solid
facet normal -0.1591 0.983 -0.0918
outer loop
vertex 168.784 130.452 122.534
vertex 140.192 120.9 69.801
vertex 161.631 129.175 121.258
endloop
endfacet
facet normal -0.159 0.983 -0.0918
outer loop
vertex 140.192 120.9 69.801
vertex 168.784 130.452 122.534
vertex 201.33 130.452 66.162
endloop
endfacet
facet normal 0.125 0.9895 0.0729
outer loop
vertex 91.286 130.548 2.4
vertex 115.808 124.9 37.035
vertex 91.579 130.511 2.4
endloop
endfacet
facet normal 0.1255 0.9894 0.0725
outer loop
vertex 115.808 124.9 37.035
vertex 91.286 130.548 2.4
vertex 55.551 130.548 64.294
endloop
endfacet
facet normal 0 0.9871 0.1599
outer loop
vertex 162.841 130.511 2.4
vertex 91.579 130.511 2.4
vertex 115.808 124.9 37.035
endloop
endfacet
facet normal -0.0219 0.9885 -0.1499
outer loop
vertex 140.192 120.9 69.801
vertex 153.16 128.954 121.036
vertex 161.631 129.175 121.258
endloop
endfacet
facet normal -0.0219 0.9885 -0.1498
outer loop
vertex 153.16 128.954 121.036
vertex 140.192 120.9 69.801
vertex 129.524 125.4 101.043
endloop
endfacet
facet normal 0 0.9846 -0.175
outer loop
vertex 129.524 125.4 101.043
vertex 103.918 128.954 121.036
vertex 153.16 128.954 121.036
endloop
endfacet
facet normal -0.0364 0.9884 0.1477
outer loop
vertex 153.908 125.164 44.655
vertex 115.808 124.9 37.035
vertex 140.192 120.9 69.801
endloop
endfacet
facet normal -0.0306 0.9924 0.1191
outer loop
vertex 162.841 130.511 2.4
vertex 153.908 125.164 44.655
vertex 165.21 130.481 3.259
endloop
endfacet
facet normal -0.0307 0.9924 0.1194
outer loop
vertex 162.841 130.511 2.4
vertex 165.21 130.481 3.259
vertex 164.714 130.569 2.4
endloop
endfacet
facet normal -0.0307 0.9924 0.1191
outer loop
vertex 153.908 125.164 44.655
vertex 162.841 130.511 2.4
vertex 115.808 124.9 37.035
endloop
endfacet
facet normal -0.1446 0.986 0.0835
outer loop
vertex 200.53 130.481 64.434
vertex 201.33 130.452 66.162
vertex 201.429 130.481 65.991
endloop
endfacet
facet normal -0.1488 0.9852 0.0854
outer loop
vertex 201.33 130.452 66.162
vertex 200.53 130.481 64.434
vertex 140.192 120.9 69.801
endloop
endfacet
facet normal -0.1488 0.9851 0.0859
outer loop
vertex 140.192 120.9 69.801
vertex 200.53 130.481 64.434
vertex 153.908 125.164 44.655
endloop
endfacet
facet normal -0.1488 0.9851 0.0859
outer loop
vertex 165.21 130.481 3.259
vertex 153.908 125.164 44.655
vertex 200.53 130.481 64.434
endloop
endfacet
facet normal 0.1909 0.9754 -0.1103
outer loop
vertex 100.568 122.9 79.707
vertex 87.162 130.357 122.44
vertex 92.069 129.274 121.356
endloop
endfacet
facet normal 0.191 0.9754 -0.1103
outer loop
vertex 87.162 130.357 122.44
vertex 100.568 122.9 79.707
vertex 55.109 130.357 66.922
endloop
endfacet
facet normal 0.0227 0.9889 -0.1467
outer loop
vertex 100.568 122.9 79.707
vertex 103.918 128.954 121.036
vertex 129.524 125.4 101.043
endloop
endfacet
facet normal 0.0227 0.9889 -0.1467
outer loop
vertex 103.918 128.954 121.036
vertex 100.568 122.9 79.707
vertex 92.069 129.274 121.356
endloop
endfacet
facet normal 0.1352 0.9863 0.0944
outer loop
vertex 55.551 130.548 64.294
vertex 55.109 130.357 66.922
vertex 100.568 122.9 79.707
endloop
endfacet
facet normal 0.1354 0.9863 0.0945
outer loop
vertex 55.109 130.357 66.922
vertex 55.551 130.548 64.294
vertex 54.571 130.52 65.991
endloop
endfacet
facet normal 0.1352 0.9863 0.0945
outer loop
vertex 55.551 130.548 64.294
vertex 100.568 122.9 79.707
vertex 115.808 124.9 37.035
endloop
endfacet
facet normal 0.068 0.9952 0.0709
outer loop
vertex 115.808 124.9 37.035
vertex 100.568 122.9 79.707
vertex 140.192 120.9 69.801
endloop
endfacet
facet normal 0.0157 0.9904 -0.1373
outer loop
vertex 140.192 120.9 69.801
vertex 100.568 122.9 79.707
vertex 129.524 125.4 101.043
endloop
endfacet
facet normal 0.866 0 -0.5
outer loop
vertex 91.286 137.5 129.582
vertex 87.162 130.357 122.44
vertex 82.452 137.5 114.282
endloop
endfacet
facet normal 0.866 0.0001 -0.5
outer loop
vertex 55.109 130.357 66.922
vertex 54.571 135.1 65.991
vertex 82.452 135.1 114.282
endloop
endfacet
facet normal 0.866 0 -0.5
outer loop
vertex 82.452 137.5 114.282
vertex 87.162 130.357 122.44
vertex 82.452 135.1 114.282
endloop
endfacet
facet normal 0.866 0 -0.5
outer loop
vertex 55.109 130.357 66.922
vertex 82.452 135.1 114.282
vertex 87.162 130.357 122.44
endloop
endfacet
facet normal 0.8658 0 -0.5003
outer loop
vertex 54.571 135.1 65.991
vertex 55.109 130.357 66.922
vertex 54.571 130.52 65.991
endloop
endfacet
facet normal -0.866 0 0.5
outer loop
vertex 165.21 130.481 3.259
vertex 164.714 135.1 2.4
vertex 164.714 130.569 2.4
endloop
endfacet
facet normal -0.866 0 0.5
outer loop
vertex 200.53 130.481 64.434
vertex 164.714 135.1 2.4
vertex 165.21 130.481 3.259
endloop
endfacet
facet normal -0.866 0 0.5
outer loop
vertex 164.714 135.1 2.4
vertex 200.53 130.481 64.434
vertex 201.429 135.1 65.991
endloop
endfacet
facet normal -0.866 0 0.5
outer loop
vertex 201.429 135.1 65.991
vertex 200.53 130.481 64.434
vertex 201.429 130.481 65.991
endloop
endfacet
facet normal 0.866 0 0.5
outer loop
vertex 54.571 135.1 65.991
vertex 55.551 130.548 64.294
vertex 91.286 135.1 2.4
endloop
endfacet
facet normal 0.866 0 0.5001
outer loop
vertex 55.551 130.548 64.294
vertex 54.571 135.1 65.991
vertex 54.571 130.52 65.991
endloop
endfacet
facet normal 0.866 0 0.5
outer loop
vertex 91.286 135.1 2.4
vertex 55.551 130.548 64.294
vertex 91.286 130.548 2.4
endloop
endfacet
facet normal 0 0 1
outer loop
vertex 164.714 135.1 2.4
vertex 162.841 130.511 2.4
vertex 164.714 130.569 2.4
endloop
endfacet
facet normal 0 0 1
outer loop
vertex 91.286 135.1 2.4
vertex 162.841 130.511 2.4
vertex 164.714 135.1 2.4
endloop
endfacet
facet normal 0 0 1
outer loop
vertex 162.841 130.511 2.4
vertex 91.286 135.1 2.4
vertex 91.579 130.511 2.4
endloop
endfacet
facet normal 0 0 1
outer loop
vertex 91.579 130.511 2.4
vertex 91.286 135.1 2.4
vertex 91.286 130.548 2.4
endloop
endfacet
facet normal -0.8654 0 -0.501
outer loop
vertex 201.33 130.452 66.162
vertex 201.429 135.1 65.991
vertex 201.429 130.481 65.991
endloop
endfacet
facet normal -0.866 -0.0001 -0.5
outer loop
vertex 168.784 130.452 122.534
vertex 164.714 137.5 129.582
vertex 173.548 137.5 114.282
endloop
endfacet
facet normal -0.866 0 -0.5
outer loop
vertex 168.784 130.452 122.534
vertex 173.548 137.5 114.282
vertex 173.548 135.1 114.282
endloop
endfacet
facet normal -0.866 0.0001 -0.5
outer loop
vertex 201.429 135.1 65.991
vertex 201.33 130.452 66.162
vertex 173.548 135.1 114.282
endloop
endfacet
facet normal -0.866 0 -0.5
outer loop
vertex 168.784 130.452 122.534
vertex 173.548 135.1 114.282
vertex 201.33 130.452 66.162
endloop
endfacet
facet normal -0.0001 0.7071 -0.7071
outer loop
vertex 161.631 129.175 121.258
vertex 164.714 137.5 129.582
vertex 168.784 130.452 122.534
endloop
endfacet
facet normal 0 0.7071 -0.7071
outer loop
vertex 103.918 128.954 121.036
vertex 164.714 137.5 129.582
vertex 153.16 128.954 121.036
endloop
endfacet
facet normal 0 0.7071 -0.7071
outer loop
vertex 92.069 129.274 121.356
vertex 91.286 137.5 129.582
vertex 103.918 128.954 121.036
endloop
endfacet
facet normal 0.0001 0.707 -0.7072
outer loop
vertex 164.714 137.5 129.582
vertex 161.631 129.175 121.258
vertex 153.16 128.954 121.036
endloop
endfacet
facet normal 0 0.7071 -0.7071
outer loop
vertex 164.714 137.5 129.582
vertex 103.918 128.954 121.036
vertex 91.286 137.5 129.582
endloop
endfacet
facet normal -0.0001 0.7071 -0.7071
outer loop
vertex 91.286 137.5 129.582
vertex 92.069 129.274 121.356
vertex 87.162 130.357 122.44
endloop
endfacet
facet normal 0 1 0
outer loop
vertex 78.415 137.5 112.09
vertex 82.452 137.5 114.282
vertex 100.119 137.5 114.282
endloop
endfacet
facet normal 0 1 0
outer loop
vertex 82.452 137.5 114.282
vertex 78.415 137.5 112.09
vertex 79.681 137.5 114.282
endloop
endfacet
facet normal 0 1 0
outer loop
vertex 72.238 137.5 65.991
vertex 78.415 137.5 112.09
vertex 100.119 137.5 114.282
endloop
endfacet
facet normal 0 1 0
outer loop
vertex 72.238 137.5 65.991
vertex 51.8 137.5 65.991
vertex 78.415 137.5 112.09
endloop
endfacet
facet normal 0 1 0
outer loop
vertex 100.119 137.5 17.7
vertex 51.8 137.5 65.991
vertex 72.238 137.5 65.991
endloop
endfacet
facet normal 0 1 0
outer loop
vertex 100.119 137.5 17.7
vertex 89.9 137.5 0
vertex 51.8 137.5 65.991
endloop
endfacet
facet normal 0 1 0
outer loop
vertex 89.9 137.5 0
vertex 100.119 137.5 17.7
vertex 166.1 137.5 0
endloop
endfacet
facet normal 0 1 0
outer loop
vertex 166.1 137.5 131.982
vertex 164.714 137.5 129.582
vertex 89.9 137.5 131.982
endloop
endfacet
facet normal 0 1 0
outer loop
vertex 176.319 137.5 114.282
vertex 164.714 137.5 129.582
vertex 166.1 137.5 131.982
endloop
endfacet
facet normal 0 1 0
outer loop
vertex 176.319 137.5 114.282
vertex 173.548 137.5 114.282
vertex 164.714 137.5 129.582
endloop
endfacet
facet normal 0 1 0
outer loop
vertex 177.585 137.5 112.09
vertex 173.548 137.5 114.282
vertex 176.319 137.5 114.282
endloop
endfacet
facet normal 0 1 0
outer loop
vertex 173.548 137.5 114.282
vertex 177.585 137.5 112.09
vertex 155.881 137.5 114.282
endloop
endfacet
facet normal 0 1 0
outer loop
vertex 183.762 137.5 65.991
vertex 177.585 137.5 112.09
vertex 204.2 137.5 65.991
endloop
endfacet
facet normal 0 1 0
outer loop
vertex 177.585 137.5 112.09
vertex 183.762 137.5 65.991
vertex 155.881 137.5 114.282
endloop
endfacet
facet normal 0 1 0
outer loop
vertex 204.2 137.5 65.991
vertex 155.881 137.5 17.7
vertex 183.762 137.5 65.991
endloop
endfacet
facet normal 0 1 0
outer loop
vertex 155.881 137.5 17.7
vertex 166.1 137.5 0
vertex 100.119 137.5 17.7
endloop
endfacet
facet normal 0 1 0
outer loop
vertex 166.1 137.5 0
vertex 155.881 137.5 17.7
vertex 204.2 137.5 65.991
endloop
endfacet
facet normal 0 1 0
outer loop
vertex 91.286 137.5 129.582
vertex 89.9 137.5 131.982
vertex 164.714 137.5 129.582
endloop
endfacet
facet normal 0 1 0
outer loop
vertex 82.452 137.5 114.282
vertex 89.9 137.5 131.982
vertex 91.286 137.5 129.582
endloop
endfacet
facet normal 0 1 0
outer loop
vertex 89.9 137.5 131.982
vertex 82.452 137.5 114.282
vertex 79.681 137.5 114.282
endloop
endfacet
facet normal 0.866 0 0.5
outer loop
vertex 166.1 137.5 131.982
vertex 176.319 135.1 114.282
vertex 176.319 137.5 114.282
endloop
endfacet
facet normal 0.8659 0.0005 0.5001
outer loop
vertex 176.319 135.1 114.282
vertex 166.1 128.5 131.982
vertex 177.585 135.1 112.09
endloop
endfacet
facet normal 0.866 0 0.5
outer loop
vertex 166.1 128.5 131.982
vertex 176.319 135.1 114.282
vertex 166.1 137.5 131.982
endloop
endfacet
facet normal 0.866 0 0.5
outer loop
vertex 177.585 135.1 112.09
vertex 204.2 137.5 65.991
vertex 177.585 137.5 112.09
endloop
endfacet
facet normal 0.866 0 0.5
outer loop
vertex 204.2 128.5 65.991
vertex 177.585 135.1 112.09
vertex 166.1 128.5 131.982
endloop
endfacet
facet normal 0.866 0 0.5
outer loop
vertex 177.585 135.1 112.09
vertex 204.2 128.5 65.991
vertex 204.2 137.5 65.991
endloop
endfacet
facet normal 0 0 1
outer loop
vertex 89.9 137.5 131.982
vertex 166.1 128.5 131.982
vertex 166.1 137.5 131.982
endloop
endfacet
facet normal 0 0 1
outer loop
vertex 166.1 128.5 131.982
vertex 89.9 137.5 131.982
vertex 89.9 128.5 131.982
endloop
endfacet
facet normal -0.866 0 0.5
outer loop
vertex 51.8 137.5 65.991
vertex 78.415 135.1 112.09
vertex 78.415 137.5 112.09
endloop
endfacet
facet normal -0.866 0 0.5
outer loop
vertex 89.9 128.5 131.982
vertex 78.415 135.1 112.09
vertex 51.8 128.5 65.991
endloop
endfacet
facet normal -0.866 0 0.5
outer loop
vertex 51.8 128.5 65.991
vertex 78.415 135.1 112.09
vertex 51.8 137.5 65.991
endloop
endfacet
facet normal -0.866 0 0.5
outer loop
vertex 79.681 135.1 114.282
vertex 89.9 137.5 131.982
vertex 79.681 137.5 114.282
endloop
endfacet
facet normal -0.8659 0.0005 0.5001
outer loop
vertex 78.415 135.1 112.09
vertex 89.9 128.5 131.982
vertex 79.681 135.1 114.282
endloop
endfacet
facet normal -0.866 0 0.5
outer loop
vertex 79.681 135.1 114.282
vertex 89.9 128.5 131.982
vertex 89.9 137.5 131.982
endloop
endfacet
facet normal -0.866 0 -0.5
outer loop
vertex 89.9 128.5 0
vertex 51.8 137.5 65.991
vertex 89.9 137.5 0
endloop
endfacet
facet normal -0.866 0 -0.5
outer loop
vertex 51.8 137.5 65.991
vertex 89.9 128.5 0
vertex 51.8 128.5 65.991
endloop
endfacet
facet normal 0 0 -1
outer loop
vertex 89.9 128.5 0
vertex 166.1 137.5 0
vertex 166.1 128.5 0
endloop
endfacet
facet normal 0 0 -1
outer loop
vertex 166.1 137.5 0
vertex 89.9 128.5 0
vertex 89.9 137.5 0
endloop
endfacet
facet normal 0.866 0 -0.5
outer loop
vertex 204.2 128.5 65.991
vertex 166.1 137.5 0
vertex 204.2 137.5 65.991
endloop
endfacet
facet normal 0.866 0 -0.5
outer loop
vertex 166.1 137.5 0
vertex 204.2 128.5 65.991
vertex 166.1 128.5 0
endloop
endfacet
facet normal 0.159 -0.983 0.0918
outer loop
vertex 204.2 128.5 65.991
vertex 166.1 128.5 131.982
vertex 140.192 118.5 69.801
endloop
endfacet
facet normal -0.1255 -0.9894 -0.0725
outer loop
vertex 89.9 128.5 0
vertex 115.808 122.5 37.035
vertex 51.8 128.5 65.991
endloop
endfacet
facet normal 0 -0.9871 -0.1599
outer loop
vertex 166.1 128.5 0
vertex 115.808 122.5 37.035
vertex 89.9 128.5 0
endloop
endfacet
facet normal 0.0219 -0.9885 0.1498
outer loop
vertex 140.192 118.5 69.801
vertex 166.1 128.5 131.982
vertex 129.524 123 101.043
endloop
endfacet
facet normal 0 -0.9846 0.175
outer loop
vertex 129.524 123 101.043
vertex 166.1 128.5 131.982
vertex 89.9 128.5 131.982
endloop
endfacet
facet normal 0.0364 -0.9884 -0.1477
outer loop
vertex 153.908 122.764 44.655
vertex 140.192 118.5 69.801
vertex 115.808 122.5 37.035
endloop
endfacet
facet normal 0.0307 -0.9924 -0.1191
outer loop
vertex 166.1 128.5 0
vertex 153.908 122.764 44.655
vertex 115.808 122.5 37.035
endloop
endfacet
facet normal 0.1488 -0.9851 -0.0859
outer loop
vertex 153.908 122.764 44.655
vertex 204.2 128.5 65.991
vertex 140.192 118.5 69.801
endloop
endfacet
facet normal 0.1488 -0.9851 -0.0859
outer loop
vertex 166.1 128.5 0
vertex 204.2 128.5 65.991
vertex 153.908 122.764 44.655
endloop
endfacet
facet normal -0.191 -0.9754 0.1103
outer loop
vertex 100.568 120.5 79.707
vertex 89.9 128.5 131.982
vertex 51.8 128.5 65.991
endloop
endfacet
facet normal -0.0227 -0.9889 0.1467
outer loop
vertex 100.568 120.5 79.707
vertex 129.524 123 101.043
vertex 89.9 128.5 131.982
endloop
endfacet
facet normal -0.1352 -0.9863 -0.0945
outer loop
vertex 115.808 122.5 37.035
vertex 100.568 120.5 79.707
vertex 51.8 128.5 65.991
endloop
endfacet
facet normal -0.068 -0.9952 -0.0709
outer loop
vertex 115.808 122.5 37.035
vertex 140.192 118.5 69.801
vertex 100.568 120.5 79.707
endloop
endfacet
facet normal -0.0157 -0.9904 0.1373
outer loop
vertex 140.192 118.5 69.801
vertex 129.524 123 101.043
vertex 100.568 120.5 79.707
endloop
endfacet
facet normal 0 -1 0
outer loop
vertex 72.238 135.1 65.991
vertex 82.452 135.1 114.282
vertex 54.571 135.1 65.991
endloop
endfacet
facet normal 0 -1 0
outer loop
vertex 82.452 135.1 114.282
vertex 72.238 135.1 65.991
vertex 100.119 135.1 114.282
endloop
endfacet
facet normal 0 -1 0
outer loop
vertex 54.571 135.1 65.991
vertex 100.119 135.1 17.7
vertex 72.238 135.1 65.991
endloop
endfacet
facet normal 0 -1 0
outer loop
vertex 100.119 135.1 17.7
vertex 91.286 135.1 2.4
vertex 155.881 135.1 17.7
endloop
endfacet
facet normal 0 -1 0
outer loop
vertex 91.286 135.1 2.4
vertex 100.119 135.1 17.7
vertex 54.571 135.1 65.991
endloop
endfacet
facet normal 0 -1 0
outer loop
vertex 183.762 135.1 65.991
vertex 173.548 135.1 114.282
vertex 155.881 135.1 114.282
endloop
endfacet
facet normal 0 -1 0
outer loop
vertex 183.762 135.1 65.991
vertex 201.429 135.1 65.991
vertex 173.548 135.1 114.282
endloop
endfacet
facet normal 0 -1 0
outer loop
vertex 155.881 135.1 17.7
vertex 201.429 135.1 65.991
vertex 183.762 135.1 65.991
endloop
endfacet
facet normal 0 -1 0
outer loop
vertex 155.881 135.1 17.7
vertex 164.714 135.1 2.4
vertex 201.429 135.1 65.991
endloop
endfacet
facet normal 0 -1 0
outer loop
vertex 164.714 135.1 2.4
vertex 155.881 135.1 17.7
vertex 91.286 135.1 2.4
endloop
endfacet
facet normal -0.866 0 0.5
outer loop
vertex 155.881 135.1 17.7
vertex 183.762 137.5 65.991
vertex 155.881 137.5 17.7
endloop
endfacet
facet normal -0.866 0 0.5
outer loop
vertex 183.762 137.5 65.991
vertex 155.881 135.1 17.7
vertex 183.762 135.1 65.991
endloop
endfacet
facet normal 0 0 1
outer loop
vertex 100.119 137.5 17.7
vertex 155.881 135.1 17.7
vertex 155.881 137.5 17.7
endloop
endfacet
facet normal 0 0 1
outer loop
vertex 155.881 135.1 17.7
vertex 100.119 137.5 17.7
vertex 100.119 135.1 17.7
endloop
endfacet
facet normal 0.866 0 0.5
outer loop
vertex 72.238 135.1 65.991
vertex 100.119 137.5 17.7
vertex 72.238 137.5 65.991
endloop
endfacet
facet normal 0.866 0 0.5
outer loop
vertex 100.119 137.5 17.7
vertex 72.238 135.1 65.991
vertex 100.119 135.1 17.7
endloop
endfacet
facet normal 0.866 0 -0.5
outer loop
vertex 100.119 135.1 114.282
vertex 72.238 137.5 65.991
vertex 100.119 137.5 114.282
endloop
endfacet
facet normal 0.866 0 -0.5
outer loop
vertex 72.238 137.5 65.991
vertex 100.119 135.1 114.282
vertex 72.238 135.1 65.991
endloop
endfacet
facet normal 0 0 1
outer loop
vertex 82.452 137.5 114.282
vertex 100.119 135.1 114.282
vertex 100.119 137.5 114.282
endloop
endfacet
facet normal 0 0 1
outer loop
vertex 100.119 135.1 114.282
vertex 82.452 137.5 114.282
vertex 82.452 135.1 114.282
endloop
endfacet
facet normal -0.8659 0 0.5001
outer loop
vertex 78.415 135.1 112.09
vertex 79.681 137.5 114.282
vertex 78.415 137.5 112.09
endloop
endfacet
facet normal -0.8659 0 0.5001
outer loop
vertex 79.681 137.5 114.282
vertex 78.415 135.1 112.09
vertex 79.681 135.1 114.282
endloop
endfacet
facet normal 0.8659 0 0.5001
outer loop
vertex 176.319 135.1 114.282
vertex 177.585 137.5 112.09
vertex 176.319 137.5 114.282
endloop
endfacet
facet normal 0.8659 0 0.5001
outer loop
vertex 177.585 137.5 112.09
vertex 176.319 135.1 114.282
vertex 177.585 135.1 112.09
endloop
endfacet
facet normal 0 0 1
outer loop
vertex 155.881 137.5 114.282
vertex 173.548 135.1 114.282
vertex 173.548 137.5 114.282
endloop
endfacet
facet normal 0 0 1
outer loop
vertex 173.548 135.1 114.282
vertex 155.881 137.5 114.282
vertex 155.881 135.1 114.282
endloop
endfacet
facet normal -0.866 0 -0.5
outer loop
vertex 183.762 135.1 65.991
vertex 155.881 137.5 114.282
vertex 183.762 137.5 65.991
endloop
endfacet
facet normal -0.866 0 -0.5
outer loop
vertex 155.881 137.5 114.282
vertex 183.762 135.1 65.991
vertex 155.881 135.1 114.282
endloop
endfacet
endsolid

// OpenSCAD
/* Faceted architectural hex tile — candidate C02, NOT production released.
 * Standalone; OpenSCAD >= 2021.01. Units: mm.
 * Read ENGINEERING.md before printing or installing.
 * Local coordinates: XY = wall plane; rear tape plane Z=0; display +Z.
 * Upright output: local +Y becomes printer +Z; display faces printer -Y.
 * No temporary connections, supports, or adhesion geometry are in this CAD.
 */

/* [Output] */
mode = "trial_single"; // [trial_single,trial_pair,inspect,section]

/* [Product] */
corner_diameter = 152.4;
edge_depth = 9;
facet_rise = 10;

/* [Face pattern] */
// Relative rises of junctions A, B, C, D. Pattern XY is fixed and reproducible.
// A=upper-left interior, B=upper-center, C=right-center, D=lower-left interior.
// E=lower-right interior is derived to keep the broad right-hand face planar.
facet_profile = [0.80, 0.55, 1.00, 0.60];

/* [Shell] */
skin_axial = 2.4;       // Offset along local Z, NOT the facet-normal thickness.
perimeter_wall = 2.4;   // In-plane normal offset of the cavity hexagon.
roof_slope = 1;         // Local Z advance per local Y rise: 1 = 45 degrees.

/* [Mounting] */
land_width = 17.7;      // In-plane normal width; U-shaped, open at the top.
land_thickness = 2.4;
tape_width = 12.7;
tape_edge_allowance = 2.5; // Per side, for width placement tolerance.

/* [Manufacturing] */
pair_gap = 20;          // Minimum raw-model gap, along printer Y.
planned_brim = 8;       // Slicer allowance only; actual brim must be added there.
machine_margin = 5;    // In addition to brim, each XY side.
build_x = 256;         // Assumed machine envelope; replace with actual usable size.
build_y = 256;
build_z = 256;
z_clearance = 5;
nominal_line_width = 0.45;

/* [Validation limits] */
minimum_face_isolation = 1.6; // Conservative CLEAR AIR to underside of face skin.
minimum_skin_normal = 2;
minimum_cavity_radius = 20;
maximum_overhang_step_ratio = 1; // Horizontal layer advance / vertical layer rise.
nominal_size_tolerance = 1.524; // +/-1% of 152.4; resizing needs a new product review.

/* [Hidden] */
eps = 0.02;
r = corner_diameter/2;
a = r*cos(30);
depth = edge_depth + facet_rise;
// Six boundary corners followed by five image-inspired interior junctions.
// All XY coordinates below are normalized to corner radius, not apothem.
pattern_xy = concat([for (i=[0:5]) [cos(60*i),sin(60*i)]],
                    [[-0.36,0.18],[0.02,0.46],[0.16,0.05],
                     [-0.16,-0.38],[0.34,-0.28]]);
right_normal = [cos(30),-sin(30)];
function dot2(u,v) = u[0]*v[0]+u[1]*v[1];
valid_profile = assert(len(facet_profile) == 4 && min(facet_profile) > 0 &&
                       max(facet_profile) == 1,
                       "Face profile needs four positive fractions, max exactly 1.")
                facet_profile;
e_fraction = valid_profile[2]*(cos(30)-dot2(right_normal,pattern_xy[10]))/
                             (cos(30)-dot2(right_normal,pattern_xy[8]));
pattern_heights = concat([0,0,0,0,0,0],valid_profile,[e_fraction]);
// Explicit CCW triangles in XY; two adjacent triangles intentionally form
// one coplanar broad right-hand facet. No runtime/random triangulation.
pattern_triangles = [[1,8,0],[4,9,3],[5,9,4],[1,7,8],[2,7,1],
                     [9,10,8],[5,10,9],[8,10,0],[10,5,0],
                     [6,2,3],[6,7,2],[9,6,3],[6,9,8],[7,6,8]];
function cross2(u,v) = u[0]*v[1]-u[1]*v[0];
function triangle_gradient(t) =
    let(u=(pattern_xy[t[1]]-pattern_xy[t[0]])*r,
        v=(pattern_xy[t[2]]-pattern_xy[t[0]])*r,
        du=(pattern_heights[t[1]]-pattern_heights[t[0]])*facet_rise,
        dv=(pattern_heights[t[2]]-pattern_heights[t[0]])*facet_rise,
        det=cross2(u,v))
    [(du*v[1]-dv*u[1])/det,(u[0]*dv-v[0]*du)/det];
facet_gradient = max([for (t=pattern_triangles) norm(triangle_gradient(t))]);
normal_factor = sqrt(1 + facet_gradient*facet_gradient);
skin_normal = skin_axial/normal_factor;
air_gap_bound = (edge_depth-skin_axial-land_thickness)/normal_factor;
cavity_r = (a-perimeter_wall)/cos(30);
open_r = (a-land_width)/cos(30);
count = mode == "trial_pair" ? 2 : 1;
envelope_x = corner_diameter+2*(planned_brim+machine_margin);
envelope_y = count*depth+(count-1)*pair_gap+2*(planned_brim+machine_margin);
envelope_z = 2*a+z_clearance;

assert(mode == "trial_single" || mode == "trial_pair" ||
       mode == "inspect" || mode == "section", "Unknown output mode.");
assert(abs(corner_diameter-152.4) <= nominal_size_tolerance &&
       nominal_size_tolerance >= 0 && nominal_size_tolerance <= 1.524,
       "Size must retain the 6-inch identity (+/-1% maximum).");
assert(edge_depth > 0 && facet_rise > 0 && depth <= 25,
       "Depth must be positive and <=25 mm for this candidate family.");
assert(e_fraction > 0 && e_fraction <= 1,
       "Derived E junction must remain in (0,1].");
assert(min([for(t=pattern_triangles)
            cross2(pattern_xy[t[1]]-pattern_xy[t[0]],
                   pattern_xy[t[2]]-pattern_xy[t[0]])]) > 0,
       "Face topology has a reversed or degenerate triangle.");
assert(skin_axial > 0 && minimum_skin_normal >= 2 &&
       skin_normal >= minimum_skin_normal, "Facet-normal skin is too thin.");
assert(nominal_line_width >= 0.25 && nominal_line_width <= 0.8 &&
       perimeter_wall >= 4*nominal_line_width &&
       land_thickness >= 4*nominal_line_width,
       "Perimeter and land need at least four nominal extrusion widths.");
assert(land_width > perimeter_wall && perimeter_wall >= skin_normal/2,
       "Invalid land / perimeter relationship.");
assert(minimum_face_isolation >= 1.6 && air_gap_bound >= minimum_face_isolation,
       "Rear land has insufficient conservative face-skin air isolation.");
assert(tape_width >= 12.7 && tape_edge_allowance >= 2 &&
       land_width >= tape_width+2*tape_edge_allowance,
       "Tape land cannot accommodate tape plus placement tolerance.");
assert(minimum_cavity_radius >= 20 && open_r >= minimum_cavity_radius &&
       cavity_r > open_r, "Cavity/land opening invalid or insufficiently hollow.");
assert(roof_slope > 0 && roof_slope <= maximum_overhang_step_ratio &&
       maximum_overhang_step_ratio > 0 && maximum_overhang_step_ratio <= 1 &&
       facet_gradient <= maximum_overhang_step_ratio,
       "Roof or facet exceeds the allowed geometric layer advance.");
assert(edge_depth/roof_slope + perimeter_wall < a-land_width,
       "Roof transition consumes too much of the upper cavity.");
assert(planned_brim >= 0 && machine_margin >= 0 && z_clearance >= 0 &&
       pair_gap >= 2*planned_brim+2,
       "Negative allowance, or pair brims overlap / have <2 mm clearance.");
assert(build_x > 0 && build_y > 0 && build_z > 0,
       "Build volume must be positive.");
if (mode == "trial_single" || mode == "trial_pair") {
    assert(envelope_x <= build_x && envelope_y <= build_y &&
           envelope_z <= build_z, "Print layout plus allowances exceeds build volume.");
}

echo(candidate="C02", output=mode, readiness="UNRELEASED GEOMETRY CANDIDATE");
echo(product_dimensions=[corner_diameter,2*a,depth],
     skin_normal_mm=skin_normal, face_air_gap_lower_bound_mm=air_gap_bound,
     maximum_face_gradient=facet_gradient, junction_fractions=pattern_heights);
echo(raw_upright_dimensions=[corner_diameter,count*depth+(count-1)*pair_gap,2*a],
     allowed_print_envelope=[envelope_x,envelope_y,envelope_z]);

function hex_points(radius) = [for (i=[0:5]) [radius*cos(60*i),radius*sin(60*i)]];

// Closed piecewise-planar height field plus straight perimeter skirt.
// Interior heights are selected design values, not recovered image depths.
// The same entire topology is translated for the inner skin, including valleys.
module faceted_volume(bottom, face_offset=0) {
    n = len(pattern_xy);
    polyhedron(
        points=concat([for (i=[0:5]) [r*pattern_xy[i][0],r*pattern_xy[i][1],bottom]],
                      [for (i=[0:n-1]) [r*pattern_xy[i][0],r*pattern_xy[i][1],
                                        edge_depth+facet_rise*pattern_heights[i]-face_offset]]),
        faces=concat([[0,1,2,3,4,5]],
                     [for (i=[0:5]) [i,6+i,6+(i+1)%6,(i+1)%6]],
                     [for (t=pattern_triangles) [6+t[2],6+t[1],6+t[0]]]), convexity=10);
}

// Cavity limit: y + z/roof_slope <= a-perimeter_wall.
// As print height increases, roof grows continuously FROM the face toward rear.
// Reversing this plane would create a floating rear lip; keep this sign.
module below_roof() {
    multmatrix([[0,0,1,0],[1,0,0,0],[0,1,0,0],[0,0,0,1]])
        linear_extrude(height=4*r,center=true)
            polygon([[-2*r,-eps],
                     [a-perimeter_wall+eps/roof_slope,-eps],
                     [a-perimeter_wall-2*depth/roof_slope,2*depth],
                     [-2*r,2*depth]]);
}

module shell() {
    difference() {
        faceted_volume(0);
        intersection() {
            faceted_volume(-eps,skin_axial);
            translate([0,0,-eps])
                linear_extrude(height=depth+2*eps)
                    polygon(hex_points(cavity_r));
            below_roof();
        }
    }
}

// Integral rear land. No top crossbar: avoids a long bridge across the opening.
// Top cutoff only removes material as upright layers rise, creating no islands.
module tape_land() {
    linear_extrude(height=land_thickness)
        intersection() {
            difference() {
                polygon(hex_points(r));
                polygon(hex_points(open_r));
            }
            translate([-2*r,-2*r]) square([4*r,2*r+a-land_width]);
        }
}

module tile() {
    union() { shell(); tape_land(); }
}

module upright() {
    translate([0,0,a]) rotate([90,0,0]) tile();
}

// Trial layouts centered on the configured rectangular usable build surface.
// Brim/margins are reserved numerically; they are not exported as plastic.
module trial_layout() {
    for (i=[0:count-1])
        translate([build_x/2,
                   build_y/2-(count*depth+(count-1)*pair_gap)/2+depth+i*(depth+pair_gap),0])
            upright();
}

if (mode == "trial_single" || mode == "trial_pair") trial_layout();
else if (mode == "inspect") tile();
else if (mode == "section")
    intersection() {
        tile();
        translate([0,-2*r,-eps]) cube([2*r,4*r,depth+2*eps]);
    }
